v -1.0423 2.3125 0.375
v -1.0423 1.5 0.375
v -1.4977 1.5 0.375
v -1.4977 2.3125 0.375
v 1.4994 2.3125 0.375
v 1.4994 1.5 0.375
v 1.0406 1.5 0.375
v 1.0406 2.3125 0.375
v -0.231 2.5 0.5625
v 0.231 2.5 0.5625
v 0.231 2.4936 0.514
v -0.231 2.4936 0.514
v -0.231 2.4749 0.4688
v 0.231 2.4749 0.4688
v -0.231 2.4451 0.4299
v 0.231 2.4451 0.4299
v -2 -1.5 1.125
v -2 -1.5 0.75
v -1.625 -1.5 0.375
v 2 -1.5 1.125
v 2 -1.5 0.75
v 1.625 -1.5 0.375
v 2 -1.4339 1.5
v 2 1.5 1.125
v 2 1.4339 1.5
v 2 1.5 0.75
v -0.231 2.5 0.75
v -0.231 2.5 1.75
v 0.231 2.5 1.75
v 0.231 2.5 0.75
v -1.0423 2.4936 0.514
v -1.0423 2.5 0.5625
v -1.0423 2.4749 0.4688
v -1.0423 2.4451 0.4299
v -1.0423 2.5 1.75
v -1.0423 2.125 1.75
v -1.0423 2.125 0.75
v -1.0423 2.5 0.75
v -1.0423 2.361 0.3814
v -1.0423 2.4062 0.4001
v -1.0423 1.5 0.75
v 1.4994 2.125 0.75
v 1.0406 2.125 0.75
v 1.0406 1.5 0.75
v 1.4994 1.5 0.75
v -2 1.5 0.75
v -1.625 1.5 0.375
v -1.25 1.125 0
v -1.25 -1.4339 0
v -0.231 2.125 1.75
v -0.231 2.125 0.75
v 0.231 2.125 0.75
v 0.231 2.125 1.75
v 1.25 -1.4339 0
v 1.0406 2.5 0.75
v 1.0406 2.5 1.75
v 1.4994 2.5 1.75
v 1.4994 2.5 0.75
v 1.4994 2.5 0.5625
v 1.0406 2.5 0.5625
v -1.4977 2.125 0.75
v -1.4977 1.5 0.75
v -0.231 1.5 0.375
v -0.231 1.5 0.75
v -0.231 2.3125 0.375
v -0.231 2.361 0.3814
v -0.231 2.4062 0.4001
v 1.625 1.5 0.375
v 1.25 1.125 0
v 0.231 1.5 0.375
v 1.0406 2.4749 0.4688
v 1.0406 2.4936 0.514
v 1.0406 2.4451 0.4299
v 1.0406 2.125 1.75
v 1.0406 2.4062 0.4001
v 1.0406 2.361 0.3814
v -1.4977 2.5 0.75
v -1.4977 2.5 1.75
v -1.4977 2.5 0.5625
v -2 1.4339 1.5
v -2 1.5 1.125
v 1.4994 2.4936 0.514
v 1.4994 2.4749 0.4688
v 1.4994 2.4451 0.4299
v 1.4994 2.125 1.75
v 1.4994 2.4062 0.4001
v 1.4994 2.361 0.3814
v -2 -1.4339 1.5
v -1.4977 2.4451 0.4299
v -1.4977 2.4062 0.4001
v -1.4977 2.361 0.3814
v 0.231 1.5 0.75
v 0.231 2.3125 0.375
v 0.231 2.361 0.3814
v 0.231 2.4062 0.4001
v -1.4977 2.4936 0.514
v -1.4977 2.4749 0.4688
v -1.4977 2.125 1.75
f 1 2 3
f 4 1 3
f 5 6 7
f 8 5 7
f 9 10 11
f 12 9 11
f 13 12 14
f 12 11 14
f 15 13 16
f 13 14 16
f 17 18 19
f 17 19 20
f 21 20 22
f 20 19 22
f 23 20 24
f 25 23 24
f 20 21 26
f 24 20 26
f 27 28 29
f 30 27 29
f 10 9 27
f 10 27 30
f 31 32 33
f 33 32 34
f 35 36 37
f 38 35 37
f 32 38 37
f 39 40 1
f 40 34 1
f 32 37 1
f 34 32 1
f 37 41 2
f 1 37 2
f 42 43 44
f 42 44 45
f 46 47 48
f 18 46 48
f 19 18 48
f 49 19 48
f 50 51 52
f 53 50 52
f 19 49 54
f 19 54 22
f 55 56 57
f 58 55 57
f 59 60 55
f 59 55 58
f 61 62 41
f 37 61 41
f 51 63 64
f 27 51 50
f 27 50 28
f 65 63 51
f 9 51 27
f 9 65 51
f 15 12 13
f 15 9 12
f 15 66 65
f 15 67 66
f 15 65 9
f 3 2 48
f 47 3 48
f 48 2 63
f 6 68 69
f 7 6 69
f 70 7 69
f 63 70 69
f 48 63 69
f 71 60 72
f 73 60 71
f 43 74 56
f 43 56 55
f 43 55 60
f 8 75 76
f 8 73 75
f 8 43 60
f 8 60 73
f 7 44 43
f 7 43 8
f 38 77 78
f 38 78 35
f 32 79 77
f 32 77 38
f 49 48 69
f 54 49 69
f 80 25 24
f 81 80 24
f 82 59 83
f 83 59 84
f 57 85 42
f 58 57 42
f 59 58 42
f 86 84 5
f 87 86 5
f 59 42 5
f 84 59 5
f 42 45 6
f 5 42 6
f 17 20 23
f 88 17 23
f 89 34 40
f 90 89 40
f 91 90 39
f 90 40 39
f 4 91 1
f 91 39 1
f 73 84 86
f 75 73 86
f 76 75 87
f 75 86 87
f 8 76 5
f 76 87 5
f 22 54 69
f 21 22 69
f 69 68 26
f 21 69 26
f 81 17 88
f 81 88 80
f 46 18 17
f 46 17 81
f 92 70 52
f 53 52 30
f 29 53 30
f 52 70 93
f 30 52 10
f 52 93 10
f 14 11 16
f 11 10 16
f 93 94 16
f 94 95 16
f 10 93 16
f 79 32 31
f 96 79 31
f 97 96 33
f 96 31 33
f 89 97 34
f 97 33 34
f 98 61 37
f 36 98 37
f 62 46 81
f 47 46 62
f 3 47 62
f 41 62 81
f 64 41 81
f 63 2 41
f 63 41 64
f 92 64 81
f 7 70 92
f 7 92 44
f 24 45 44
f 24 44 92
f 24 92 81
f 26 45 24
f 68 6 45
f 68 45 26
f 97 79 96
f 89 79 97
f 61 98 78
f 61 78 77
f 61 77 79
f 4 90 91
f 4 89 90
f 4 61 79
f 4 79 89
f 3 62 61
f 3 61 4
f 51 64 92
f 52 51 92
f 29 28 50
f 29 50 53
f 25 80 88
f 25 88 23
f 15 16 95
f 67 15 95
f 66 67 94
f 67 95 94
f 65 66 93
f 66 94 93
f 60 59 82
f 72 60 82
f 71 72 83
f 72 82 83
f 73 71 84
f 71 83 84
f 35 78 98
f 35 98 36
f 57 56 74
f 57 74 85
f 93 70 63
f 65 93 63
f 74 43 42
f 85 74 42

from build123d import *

# Parameters (mm, degrees)
CROQUIS1_W              = 4
CROQUIS1_H              = 3
SALIENTE_EXTRUIR1_DEPTH = 1.5
CORTAR_EXTRUIR1_DEPTH   = 3
CORTAR_EXTRUIR2_DEPTH   = 4
CROQUIS7_W              = 0.455301138
CROQUIS7_H              = 0.375
CROQUIS7_W_2            = 0.462078838
CROQUIS7_W_3            = 0.458790222
SALIENTE_EXTRUIR3_DEPTH = 1
CROQUIS8_W              = 0.462078838
CROQUIS8_H              = 0.375
CROQUIS8_W_2            = 0.458790222
CROQUIS8_W_3            = 0.455301138
SALIENTE_EXTRUIR4_DEPTH = 1
CORTAR_EXTRUIR3_DEPTH   = 3


with BuildPart() as part:
    # Croquis1 → Saliente-Extruir1 (new body)
    with BuildSketch(Plane.XY):
        Rectangle(CROQUIS1_W, CROQUIS1_H)
    extrude(amount=SALIENTE_EXTRUIR1_DEPTH)

    # Croquis3 → Cortar-Extruir1 (cut)
    with BuildSketch(Plane(origin=(0, 1.5, 0), x_dir=(1, 0, 0), z_dir=(0, 1, 0))):
        Polygon((-2, 0), (-2, -0.75), (-1.25, 0), align=None)
        Polygon((1.25, 0), (2, -0.75), (2, 0), align=None)
    extrude(amount=-CORTAR_EXTRUIR1_DEPTH, mode=Mode.SUBTRACT)

    # Croquis6 → Cortar-Extruir2 (cut)
    with BuildSketch(Plane(origin=(2, 0, 0), x_dir=(0, 0, -1), z_dir=(1, 0, 0))):
        Polygon((0, 1.125), (0, 1.5), (-0.375, 1.5), align=None)
        Polygon((0, -1.5), (0, -1.433877382), (-0.375, -1.5), align=None)
        Polygon((-1.5, 1.433877382), (-1.125, 1.5), (-1.5, 1.5), align=None)
        Polygon((-1.5, -1.5), (-1.125, -1.5), (-1.5, -1.433877382), align=None)
    extrude(amount=-CORTAR_EXTRUIR2_DEPTH, mode=Mode.SUBTRACT)

    # Croquis7 → Saliente-Extruir3 (add)
    with BuildSketch(Plane(origin=(0, 1.5, 0), x_dir=(1, 0, 0), z_dir=(0, 1, 0))):
        with Locations((-1.27, -0.5625)):
            Rectangle(CROQUIS7_W, CROQUIS7_H)
        with Locations((0, -0.5625)):
            Rectangle(CROQUIS7_W_2, CROQUIS7_H)
        with Locations((1.27, -0.5625)):
            Rectangle(CROQUIS7_W_3, CROQUIS7_H)
    extrude(amount=SALIENTE_EXTRUIR3_DEPTH)

    # Croquis8 → Saliente-Extruir4 (add)
    with BuildSketch(Plane.XY.offset(0.75)):
        with Locations((0, 2.3125)):
            Rectangle(CROQUIS8_W, CROQUIS8_H)
        with Locations((1.27, 2.3125)):
            Rectangle(CROQUIS8_W_2, CROQUIS8_H)
        with Locations((-1.27, 2.3125)):
            Rectangle(CROQUIS8_W_3, CROQUIS8_H)
    extrude(amount=SALIENTE_EXTRUIR4_DEPTH)

    # Croquis11 → Cortar-Extruir3 (cut)
    with BuildSketch(Plane(origin=(1.499395111, 0, 0), x_dir=(0, 0, -1), z_dir=(1, 0, 0))):
        with BuildLine():
            Line((-0.375, 2.3125), (-0.375, 2.5))
            Line((-0.375, 2.5), (-0.5625, 2.5))
            ThreePointArc((-0.5625, 2.5), (-0.429917479, 2.445082521), (-0.375, 2.3125))
        make_face()
    extrude(amount=-CORTAR_EXTRUIR3_DEPTH, mode=Mode.SUBTRACT)


solid = part.part
